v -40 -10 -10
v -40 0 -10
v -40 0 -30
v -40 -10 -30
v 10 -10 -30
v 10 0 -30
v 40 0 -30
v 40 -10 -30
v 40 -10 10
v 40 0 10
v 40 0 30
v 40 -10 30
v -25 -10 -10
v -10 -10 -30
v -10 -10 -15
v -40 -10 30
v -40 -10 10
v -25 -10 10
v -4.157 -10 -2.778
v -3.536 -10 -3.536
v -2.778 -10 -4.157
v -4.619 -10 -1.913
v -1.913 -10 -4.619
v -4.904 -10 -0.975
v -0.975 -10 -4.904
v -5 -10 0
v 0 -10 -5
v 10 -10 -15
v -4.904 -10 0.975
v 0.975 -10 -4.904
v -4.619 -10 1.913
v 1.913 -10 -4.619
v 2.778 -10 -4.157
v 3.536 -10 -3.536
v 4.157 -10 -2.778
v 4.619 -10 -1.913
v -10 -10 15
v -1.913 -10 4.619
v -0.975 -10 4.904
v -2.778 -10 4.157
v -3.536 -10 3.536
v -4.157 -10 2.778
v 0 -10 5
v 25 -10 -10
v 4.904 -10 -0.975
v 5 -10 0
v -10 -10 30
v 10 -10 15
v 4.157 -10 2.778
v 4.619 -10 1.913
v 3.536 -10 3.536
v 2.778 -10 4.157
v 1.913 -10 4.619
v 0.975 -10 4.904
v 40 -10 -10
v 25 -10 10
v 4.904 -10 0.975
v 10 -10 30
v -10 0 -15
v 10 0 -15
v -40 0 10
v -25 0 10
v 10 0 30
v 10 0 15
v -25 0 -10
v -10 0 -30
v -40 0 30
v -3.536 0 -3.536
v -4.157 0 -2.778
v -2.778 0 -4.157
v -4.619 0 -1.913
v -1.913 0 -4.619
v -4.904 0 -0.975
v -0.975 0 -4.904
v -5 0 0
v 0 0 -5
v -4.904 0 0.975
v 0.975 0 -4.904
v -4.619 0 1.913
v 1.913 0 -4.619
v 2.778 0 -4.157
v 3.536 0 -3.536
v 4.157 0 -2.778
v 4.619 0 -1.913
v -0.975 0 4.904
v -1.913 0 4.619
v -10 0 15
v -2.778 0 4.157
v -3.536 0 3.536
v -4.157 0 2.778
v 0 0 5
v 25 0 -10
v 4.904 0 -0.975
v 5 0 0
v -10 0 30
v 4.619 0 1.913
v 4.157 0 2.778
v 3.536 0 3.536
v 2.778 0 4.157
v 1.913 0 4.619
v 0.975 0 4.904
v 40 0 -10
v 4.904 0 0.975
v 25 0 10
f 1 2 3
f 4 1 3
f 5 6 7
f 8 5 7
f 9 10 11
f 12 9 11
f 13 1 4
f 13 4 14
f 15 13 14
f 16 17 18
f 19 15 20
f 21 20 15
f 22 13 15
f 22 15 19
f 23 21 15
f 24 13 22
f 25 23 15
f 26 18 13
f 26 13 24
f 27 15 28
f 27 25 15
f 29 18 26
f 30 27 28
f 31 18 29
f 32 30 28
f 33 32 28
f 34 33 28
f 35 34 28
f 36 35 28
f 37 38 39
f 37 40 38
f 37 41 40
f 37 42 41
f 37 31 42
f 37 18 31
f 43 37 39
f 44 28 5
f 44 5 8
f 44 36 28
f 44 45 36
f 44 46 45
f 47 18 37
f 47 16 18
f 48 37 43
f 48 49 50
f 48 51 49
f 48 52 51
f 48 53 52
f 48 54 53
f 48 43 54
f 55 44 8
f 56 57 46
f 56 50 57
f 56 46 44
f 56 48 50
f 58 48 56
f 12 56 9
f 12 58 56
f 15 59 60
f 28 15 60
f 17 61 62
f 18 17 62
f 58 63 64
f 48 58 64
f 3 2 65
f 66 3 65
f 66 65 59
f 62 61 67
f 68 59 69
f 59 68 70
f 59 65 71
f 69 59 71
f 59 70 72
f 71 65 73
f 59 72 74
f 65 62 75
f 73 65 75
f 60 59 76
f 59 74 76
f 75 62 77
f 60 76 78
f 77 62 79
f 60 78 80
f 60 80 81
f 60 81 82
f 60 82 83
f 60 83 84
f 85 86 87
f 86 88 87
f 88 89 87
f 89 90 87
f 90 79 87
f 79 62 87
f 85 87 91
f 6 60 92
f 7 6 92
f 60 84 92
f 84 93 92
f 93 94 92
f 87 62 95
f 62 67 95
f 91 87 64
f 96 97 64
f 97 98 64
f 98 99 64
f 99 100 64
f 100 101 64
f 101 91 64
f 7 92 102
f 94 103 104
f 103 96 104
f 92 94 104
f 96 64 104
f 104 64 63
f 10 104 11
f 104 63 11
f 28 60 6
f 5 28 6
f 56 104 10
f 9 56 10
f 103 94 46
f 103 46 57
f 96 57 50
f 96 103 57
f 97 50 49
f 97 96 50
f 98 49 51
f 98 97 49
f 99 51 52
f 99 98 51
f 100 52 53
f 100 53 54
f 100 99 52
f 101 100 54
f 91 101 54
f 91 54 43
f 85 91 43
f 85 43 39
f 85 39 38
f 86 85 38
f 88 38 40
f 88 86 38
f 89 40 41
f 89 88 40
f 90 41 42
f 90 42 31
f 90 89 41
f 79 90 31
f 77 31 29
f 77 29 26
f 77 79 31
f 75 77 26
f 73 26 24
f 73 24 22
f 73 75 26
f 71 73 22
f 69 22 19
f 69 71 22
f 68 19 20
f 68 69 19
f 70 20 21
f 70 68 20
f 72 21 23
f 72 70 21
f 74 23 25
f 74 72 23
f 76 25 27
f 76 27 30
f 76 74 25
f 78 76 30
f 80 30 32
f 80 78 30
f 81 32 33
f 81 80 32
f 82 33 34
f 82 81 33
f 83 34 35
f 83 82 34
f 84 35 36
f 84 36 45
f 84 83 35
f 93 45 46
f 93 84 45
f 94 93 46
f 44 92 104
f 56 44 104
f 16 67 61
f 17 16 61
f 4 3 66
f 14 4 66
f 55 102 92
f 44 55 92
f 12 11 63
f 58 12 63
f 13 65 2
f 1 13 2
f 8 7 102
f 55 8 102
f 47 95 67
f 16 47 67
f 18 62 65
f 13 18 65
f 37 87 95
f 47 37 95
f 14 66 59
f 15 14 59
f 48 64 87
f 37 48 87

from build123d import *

# Parameters (mm, degrees)
F0_R     = 5
F1_DEPTH = 10


with BuildPart() as f1:
    # F0 (on Front) → F1 (new body)
    with BuildSketch(Plane.XZ):
        Polygon((-25, 10), (-25, 0), (-25, -10), (-40, -10), (-40, -30), (-10, -30), (-10, -15), (0, -15), (10, -15), (10, -30), (40, -30), (40, -10), (25, -10), (25, 0), (25, 10), (40, 10), (40, 30), (10, 30), (10, 15), (0, 15), (-10, 15), (-10, 30), (-40, 30), (-40, 10), align=None)
        Circle(F0_R, mode=Mode.SUBTRACT)
    extrude(amount=F1_DEPTH)


solid = f1.part
